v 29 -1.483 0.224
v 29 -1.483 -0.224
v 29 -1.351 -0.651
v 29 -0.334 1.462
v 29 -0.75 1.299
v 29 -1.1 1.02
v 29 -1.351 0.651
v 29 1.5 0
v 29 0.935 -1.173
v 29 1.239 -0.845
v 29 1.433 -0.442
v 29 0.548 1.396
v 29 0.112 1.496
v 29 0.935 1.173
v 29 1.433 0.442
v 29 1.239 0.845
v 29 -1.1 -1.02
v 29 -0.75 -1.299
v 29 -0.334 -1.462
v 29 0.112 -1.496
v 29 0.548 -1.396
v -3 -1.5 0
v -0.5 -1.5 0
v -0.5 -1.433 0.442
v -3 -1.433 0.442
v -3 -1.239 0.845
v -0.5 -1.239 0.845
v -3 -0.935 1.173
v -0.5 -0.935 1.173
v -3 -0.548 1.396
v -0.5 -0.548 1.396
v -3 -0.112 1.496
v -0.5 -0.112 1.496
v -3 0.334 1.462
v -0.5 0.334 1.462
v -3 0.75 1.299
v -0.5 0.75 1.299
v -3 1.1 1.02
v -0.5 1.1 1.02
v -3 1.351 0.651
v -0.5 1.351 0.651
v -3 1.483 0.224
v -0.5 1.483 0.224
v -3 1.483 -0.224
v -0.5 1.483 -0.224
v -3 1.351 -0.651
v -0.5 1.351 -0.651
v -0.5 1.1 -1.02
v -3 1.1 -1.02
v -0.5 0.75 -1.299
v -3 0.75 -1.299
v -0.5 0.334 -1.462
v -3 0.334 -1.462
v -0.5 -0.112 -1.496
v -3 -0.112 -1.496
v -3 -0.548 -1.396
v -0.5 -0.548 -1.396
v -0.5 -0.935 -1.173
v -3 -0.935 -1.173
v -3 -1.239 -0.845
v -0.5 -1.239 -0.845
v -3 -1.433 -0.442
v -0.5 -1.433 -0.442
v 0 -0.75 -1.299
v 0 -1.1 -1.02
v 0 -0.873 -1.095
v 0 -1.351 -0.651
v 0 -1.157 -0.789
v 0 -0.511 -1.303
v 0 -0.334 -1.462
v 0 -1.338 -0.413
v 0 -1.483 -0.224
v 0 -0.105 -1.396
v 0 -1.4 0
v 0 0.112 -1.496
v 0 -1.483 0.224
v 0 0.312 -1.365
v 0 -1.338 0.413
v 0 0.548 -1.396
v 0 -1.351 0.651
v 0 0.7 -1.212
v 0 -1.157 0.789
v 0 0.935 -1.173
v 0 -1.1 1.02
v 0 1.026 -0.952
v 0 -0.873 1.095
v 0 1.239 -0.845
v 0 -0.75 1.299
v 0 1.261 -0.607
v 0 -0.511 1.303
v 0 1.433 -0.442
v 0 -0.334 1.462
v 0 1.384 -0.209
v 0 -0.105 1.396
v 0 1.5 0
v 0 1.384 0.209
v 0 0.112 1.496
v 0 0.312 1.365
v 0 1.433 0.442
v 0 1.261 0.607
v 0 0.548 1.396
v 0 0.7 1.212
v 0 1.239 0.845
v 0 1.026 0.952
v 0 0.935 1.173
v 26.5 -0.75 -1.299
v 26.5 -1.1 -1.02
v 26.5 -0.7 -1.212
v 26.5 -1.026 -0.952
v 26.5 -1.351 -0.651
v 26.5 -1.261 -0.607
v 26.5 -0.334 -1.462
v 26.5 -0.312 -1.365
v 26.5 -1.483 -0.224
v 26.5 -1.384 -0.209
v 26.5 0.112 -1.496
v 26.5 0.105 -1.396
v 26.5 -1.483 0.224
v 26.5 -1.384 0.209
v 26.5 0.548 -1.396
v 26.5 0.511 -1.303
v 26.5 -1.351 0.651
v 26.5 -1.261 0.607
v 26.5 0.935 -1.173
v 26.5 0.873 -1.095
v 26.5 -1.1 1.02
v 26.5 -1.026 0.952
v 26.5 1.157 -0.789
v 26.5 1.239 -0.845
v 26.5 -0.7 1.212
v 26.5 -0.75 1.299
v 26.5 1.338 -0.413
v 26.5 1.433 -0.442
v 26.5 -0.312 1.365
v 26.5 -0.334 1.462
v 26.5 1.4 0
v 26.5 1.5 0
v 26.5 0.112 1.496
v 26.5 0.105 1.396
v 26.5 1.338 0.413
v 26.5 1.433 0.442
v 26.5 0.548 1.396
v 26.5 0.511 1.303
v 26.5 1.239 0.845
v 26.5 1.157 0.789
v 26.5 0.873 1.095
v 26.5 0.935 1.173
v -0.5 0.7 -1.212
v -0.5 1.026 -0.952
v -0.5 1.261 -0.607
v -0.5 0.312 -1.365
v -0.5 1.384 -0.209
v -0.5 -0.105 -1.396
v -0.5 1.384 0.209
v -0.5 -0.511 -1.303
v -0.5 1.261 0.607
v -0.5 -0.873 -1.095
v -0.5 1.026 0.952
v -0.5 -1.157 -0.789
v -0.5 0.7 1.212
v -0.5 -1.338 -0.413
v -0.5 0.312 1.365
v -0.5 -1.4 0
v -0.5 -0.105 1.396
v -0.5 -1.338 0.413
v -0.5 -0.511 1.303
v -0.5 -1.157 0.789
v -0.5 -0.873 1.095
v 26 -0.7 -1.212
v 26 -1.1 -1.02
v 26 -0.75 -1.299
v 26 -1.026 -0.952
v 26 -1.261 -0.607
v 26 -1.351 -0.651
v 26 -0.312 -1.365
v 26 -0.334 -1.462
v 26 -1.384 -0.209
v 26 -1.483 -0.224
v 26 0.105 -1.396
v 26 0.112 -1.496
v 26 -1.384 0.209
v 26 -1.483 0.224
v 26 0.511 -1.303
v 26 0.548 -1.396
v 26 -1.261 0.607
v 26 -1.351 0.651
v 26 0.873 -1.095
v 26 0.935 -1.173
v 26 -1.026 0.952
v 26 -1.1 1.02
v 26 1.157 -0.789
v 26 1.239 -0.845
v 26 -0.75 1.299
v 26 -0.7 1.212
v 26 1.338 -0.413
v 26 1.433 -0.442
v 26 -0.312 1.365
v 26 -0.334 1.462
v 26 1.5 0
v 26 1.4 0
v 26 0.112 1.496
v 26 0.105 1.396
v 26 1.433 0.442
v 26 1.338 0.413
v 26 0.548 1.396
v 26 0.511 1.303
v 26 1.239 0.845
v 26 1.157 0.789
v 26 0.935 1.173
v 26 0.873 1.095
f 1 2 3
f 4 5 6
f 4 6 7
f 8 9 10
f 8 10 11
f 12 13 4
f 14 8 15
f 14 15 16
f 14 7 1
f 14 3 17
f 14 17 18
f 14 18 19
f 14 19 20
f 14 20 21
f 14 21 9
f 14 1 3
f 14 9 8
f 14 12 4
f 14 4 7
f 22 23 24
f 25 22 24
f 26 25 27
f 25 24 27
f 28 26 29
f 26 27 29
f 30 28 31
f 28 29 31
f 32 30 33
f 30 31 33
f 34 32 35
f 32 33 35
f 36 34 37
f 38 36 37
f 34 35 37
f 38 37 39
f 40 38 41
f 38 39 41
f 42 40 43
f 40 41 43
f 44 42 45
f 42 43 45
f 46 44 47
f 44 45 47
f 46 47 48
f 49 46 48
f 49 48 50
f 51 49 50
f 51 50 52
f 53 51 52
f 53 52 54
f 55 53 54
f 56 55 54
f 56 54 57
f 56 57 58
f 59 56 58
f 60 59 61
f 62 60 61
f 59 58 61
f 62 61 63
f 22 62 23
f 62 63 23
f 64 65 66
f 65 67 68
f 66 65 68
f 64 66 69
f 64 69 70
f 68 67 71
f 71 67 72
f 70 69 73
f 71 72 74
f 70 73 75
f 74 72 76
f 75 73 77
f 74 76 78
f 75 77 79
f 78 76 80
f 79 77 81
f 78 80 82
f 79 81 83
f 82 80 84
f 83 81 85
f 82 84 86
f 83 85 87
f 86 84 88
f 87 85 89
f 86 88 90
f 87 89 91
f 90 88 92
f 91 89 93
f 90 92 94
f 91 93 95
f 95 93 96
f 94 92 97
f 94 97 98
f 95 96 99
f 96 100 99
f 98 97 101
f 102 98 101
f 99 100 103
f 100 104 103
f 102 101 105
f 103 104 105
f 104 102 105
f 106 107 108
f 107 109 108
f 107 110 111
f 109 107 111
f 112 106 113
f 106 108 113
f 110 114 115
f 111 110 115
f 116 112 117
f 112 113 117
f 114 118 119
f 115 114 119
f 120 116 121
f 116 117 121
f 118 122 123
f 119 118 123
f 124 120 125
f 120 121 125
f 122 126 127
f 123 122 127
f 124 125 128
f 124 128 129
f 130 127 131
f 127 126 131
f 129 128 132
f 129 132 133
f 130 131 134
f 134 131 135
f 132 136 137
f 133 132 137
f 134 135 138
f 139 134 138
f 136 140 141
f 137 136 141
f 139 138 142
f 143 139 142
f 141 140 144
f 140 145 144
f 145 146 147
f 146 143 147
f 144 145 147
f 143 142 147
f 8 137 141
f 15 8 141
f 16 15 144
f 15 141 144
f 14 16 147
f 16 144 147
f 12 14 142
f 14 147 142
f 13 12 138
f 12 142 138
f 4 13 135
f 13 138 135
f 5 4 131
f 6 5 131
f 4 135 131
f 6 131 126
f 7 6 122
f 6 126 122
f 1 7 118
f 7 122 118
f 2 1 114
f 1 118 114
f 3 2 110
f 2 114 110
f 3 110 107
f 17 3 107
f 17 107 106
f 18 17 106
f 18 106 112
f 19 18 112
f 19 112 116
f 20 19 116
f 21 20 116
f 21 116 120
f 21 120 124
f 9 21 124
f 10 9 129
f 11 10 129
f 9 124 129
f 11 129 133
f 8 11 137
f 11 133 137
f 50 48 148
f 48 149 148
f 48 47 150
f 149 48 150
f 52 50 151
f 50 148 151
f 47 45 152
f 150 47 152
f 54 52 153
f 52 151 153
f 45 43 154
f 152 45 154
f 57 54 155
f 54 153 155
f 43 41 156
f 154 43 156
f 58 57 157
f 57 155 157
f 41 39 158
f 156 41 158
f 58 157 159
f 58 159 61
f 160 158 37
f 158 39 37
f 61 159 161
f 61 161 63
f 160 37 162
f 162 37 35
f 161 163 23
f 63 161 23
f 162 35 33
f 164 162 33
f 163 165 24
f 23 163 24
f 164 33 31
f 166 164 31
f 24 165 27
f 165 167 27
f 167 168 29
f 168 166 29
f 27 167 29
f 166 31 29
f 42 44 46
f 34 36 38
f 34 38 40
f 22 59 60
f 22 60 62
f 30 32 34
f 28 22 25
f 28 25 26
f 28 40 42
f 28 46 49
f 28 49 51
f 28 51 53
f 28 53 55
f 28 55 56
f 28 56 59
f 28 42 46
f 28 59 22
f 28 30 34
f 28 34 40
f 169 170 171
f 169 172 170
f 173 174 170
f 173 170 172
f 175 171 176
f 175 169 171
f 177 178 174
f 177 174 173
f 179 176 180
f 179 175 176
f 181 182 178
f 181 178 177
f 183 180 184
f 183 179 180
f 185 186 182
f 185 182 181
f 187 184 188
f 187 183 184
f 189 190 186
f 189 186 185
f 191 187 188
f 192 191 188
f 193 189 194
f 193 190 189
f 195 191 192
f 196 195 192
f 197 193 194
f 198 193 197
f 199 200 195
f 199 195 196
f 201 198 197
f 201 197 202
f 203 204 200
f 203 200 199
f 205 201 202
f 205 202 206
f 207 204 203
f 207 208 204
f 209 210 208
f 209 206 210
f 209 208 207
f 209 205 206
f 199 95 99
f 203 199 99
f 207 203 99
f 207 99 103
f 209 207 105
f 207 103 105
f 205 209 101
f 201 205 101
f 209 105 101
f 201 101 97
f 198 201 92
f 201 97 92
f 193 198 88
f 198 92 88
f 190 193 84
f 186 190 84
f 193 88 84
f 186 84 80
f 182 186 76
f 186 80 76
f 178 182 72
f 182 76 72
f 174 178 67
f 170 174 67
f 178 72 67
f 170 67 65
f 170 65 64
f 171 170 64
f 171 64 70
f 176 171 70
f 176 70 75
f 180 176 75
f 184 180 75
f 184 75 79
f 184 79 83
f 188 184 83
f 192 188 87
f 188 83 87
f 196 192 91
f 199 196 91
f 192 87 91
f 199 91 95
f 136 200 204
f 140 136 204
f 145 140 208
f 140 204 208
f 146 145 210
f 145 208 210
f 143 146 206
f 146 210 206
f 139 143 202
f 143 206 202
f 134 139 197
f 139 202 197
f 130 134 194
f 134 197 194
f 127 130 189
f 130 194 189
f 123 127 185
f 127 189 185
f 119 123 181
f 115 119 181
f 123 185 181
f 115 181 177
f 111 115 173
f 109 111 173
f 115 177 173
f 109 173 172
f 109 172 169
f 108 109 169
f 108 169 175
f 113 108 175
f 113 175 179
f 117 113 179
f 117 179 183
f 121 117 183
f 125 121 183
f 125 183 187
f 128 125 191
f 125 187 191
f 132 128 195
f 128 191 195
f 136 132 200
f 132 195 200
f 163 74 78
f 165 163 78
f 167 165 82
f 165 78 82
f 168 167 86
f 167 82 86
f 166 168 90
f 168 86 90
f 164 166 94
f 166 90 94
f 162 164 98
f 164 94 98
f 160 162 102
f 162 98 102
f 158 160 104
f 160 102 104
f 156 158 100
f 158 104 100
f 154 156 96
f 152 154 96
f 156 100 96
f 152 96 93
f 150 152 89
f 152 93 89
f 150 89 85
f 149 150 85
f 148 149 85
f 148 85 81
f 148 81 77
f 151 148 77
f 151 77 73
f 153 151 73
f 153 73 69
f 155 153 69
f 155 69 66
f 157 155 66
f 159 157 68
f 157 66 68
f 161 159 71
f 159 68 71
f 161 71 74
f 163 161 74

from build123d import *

# Parameters (mm, degrees)
F0_R     = 1.5
F1_DEPTH = 26
F2_R     = 1.4
F3_DEPTH = 0.5
F4_R     = 1.4
F5_DEPTH = 0.5
F6_R     = 1.5
F7_DEPTH = 2.5
F8_R     = 1.5
F9_DEPTH = 2.5


with BuildPart() as f1:
    # F0 (on Right) → F1 (new body)
    with BuildSketch(Plane.YZ):
        Circle(F0_R)
    extrude(amount=F1_DEPTH)

    # F2 (on face) → F3 (join)
    with BuildSketch(Plane.YZ.offset(26)):
        Circle(F2_R)
    extrude(amount=F3_DEPTH)

    # F4 (on face) → F5 (join)
    with BuildSketch(Plane(origin=(0, 0, 0), x_dir=(0, -1, 0), z_dir=(-1, 0, 0))):
        Circle(F4_R)
    extrude(amount=F5_DEPTH)

    # F6 (on face) → F7 (join)
    with BuildSketch(Plane(origin=(-0.5, 0, 0), x_dir=(0, -1, 0), z_dir=(-1, 0, 0))):
        Circle(F6_R)
    extrude(amount=F7_DEPTH)

    # F8 (on face) → F9 (join)
    with BuildSketch(Plane.YZ.offset(26.5)):
        Circle(F8_R)
    extrude(amount=F9_DEPTH)


solid = f1.part
